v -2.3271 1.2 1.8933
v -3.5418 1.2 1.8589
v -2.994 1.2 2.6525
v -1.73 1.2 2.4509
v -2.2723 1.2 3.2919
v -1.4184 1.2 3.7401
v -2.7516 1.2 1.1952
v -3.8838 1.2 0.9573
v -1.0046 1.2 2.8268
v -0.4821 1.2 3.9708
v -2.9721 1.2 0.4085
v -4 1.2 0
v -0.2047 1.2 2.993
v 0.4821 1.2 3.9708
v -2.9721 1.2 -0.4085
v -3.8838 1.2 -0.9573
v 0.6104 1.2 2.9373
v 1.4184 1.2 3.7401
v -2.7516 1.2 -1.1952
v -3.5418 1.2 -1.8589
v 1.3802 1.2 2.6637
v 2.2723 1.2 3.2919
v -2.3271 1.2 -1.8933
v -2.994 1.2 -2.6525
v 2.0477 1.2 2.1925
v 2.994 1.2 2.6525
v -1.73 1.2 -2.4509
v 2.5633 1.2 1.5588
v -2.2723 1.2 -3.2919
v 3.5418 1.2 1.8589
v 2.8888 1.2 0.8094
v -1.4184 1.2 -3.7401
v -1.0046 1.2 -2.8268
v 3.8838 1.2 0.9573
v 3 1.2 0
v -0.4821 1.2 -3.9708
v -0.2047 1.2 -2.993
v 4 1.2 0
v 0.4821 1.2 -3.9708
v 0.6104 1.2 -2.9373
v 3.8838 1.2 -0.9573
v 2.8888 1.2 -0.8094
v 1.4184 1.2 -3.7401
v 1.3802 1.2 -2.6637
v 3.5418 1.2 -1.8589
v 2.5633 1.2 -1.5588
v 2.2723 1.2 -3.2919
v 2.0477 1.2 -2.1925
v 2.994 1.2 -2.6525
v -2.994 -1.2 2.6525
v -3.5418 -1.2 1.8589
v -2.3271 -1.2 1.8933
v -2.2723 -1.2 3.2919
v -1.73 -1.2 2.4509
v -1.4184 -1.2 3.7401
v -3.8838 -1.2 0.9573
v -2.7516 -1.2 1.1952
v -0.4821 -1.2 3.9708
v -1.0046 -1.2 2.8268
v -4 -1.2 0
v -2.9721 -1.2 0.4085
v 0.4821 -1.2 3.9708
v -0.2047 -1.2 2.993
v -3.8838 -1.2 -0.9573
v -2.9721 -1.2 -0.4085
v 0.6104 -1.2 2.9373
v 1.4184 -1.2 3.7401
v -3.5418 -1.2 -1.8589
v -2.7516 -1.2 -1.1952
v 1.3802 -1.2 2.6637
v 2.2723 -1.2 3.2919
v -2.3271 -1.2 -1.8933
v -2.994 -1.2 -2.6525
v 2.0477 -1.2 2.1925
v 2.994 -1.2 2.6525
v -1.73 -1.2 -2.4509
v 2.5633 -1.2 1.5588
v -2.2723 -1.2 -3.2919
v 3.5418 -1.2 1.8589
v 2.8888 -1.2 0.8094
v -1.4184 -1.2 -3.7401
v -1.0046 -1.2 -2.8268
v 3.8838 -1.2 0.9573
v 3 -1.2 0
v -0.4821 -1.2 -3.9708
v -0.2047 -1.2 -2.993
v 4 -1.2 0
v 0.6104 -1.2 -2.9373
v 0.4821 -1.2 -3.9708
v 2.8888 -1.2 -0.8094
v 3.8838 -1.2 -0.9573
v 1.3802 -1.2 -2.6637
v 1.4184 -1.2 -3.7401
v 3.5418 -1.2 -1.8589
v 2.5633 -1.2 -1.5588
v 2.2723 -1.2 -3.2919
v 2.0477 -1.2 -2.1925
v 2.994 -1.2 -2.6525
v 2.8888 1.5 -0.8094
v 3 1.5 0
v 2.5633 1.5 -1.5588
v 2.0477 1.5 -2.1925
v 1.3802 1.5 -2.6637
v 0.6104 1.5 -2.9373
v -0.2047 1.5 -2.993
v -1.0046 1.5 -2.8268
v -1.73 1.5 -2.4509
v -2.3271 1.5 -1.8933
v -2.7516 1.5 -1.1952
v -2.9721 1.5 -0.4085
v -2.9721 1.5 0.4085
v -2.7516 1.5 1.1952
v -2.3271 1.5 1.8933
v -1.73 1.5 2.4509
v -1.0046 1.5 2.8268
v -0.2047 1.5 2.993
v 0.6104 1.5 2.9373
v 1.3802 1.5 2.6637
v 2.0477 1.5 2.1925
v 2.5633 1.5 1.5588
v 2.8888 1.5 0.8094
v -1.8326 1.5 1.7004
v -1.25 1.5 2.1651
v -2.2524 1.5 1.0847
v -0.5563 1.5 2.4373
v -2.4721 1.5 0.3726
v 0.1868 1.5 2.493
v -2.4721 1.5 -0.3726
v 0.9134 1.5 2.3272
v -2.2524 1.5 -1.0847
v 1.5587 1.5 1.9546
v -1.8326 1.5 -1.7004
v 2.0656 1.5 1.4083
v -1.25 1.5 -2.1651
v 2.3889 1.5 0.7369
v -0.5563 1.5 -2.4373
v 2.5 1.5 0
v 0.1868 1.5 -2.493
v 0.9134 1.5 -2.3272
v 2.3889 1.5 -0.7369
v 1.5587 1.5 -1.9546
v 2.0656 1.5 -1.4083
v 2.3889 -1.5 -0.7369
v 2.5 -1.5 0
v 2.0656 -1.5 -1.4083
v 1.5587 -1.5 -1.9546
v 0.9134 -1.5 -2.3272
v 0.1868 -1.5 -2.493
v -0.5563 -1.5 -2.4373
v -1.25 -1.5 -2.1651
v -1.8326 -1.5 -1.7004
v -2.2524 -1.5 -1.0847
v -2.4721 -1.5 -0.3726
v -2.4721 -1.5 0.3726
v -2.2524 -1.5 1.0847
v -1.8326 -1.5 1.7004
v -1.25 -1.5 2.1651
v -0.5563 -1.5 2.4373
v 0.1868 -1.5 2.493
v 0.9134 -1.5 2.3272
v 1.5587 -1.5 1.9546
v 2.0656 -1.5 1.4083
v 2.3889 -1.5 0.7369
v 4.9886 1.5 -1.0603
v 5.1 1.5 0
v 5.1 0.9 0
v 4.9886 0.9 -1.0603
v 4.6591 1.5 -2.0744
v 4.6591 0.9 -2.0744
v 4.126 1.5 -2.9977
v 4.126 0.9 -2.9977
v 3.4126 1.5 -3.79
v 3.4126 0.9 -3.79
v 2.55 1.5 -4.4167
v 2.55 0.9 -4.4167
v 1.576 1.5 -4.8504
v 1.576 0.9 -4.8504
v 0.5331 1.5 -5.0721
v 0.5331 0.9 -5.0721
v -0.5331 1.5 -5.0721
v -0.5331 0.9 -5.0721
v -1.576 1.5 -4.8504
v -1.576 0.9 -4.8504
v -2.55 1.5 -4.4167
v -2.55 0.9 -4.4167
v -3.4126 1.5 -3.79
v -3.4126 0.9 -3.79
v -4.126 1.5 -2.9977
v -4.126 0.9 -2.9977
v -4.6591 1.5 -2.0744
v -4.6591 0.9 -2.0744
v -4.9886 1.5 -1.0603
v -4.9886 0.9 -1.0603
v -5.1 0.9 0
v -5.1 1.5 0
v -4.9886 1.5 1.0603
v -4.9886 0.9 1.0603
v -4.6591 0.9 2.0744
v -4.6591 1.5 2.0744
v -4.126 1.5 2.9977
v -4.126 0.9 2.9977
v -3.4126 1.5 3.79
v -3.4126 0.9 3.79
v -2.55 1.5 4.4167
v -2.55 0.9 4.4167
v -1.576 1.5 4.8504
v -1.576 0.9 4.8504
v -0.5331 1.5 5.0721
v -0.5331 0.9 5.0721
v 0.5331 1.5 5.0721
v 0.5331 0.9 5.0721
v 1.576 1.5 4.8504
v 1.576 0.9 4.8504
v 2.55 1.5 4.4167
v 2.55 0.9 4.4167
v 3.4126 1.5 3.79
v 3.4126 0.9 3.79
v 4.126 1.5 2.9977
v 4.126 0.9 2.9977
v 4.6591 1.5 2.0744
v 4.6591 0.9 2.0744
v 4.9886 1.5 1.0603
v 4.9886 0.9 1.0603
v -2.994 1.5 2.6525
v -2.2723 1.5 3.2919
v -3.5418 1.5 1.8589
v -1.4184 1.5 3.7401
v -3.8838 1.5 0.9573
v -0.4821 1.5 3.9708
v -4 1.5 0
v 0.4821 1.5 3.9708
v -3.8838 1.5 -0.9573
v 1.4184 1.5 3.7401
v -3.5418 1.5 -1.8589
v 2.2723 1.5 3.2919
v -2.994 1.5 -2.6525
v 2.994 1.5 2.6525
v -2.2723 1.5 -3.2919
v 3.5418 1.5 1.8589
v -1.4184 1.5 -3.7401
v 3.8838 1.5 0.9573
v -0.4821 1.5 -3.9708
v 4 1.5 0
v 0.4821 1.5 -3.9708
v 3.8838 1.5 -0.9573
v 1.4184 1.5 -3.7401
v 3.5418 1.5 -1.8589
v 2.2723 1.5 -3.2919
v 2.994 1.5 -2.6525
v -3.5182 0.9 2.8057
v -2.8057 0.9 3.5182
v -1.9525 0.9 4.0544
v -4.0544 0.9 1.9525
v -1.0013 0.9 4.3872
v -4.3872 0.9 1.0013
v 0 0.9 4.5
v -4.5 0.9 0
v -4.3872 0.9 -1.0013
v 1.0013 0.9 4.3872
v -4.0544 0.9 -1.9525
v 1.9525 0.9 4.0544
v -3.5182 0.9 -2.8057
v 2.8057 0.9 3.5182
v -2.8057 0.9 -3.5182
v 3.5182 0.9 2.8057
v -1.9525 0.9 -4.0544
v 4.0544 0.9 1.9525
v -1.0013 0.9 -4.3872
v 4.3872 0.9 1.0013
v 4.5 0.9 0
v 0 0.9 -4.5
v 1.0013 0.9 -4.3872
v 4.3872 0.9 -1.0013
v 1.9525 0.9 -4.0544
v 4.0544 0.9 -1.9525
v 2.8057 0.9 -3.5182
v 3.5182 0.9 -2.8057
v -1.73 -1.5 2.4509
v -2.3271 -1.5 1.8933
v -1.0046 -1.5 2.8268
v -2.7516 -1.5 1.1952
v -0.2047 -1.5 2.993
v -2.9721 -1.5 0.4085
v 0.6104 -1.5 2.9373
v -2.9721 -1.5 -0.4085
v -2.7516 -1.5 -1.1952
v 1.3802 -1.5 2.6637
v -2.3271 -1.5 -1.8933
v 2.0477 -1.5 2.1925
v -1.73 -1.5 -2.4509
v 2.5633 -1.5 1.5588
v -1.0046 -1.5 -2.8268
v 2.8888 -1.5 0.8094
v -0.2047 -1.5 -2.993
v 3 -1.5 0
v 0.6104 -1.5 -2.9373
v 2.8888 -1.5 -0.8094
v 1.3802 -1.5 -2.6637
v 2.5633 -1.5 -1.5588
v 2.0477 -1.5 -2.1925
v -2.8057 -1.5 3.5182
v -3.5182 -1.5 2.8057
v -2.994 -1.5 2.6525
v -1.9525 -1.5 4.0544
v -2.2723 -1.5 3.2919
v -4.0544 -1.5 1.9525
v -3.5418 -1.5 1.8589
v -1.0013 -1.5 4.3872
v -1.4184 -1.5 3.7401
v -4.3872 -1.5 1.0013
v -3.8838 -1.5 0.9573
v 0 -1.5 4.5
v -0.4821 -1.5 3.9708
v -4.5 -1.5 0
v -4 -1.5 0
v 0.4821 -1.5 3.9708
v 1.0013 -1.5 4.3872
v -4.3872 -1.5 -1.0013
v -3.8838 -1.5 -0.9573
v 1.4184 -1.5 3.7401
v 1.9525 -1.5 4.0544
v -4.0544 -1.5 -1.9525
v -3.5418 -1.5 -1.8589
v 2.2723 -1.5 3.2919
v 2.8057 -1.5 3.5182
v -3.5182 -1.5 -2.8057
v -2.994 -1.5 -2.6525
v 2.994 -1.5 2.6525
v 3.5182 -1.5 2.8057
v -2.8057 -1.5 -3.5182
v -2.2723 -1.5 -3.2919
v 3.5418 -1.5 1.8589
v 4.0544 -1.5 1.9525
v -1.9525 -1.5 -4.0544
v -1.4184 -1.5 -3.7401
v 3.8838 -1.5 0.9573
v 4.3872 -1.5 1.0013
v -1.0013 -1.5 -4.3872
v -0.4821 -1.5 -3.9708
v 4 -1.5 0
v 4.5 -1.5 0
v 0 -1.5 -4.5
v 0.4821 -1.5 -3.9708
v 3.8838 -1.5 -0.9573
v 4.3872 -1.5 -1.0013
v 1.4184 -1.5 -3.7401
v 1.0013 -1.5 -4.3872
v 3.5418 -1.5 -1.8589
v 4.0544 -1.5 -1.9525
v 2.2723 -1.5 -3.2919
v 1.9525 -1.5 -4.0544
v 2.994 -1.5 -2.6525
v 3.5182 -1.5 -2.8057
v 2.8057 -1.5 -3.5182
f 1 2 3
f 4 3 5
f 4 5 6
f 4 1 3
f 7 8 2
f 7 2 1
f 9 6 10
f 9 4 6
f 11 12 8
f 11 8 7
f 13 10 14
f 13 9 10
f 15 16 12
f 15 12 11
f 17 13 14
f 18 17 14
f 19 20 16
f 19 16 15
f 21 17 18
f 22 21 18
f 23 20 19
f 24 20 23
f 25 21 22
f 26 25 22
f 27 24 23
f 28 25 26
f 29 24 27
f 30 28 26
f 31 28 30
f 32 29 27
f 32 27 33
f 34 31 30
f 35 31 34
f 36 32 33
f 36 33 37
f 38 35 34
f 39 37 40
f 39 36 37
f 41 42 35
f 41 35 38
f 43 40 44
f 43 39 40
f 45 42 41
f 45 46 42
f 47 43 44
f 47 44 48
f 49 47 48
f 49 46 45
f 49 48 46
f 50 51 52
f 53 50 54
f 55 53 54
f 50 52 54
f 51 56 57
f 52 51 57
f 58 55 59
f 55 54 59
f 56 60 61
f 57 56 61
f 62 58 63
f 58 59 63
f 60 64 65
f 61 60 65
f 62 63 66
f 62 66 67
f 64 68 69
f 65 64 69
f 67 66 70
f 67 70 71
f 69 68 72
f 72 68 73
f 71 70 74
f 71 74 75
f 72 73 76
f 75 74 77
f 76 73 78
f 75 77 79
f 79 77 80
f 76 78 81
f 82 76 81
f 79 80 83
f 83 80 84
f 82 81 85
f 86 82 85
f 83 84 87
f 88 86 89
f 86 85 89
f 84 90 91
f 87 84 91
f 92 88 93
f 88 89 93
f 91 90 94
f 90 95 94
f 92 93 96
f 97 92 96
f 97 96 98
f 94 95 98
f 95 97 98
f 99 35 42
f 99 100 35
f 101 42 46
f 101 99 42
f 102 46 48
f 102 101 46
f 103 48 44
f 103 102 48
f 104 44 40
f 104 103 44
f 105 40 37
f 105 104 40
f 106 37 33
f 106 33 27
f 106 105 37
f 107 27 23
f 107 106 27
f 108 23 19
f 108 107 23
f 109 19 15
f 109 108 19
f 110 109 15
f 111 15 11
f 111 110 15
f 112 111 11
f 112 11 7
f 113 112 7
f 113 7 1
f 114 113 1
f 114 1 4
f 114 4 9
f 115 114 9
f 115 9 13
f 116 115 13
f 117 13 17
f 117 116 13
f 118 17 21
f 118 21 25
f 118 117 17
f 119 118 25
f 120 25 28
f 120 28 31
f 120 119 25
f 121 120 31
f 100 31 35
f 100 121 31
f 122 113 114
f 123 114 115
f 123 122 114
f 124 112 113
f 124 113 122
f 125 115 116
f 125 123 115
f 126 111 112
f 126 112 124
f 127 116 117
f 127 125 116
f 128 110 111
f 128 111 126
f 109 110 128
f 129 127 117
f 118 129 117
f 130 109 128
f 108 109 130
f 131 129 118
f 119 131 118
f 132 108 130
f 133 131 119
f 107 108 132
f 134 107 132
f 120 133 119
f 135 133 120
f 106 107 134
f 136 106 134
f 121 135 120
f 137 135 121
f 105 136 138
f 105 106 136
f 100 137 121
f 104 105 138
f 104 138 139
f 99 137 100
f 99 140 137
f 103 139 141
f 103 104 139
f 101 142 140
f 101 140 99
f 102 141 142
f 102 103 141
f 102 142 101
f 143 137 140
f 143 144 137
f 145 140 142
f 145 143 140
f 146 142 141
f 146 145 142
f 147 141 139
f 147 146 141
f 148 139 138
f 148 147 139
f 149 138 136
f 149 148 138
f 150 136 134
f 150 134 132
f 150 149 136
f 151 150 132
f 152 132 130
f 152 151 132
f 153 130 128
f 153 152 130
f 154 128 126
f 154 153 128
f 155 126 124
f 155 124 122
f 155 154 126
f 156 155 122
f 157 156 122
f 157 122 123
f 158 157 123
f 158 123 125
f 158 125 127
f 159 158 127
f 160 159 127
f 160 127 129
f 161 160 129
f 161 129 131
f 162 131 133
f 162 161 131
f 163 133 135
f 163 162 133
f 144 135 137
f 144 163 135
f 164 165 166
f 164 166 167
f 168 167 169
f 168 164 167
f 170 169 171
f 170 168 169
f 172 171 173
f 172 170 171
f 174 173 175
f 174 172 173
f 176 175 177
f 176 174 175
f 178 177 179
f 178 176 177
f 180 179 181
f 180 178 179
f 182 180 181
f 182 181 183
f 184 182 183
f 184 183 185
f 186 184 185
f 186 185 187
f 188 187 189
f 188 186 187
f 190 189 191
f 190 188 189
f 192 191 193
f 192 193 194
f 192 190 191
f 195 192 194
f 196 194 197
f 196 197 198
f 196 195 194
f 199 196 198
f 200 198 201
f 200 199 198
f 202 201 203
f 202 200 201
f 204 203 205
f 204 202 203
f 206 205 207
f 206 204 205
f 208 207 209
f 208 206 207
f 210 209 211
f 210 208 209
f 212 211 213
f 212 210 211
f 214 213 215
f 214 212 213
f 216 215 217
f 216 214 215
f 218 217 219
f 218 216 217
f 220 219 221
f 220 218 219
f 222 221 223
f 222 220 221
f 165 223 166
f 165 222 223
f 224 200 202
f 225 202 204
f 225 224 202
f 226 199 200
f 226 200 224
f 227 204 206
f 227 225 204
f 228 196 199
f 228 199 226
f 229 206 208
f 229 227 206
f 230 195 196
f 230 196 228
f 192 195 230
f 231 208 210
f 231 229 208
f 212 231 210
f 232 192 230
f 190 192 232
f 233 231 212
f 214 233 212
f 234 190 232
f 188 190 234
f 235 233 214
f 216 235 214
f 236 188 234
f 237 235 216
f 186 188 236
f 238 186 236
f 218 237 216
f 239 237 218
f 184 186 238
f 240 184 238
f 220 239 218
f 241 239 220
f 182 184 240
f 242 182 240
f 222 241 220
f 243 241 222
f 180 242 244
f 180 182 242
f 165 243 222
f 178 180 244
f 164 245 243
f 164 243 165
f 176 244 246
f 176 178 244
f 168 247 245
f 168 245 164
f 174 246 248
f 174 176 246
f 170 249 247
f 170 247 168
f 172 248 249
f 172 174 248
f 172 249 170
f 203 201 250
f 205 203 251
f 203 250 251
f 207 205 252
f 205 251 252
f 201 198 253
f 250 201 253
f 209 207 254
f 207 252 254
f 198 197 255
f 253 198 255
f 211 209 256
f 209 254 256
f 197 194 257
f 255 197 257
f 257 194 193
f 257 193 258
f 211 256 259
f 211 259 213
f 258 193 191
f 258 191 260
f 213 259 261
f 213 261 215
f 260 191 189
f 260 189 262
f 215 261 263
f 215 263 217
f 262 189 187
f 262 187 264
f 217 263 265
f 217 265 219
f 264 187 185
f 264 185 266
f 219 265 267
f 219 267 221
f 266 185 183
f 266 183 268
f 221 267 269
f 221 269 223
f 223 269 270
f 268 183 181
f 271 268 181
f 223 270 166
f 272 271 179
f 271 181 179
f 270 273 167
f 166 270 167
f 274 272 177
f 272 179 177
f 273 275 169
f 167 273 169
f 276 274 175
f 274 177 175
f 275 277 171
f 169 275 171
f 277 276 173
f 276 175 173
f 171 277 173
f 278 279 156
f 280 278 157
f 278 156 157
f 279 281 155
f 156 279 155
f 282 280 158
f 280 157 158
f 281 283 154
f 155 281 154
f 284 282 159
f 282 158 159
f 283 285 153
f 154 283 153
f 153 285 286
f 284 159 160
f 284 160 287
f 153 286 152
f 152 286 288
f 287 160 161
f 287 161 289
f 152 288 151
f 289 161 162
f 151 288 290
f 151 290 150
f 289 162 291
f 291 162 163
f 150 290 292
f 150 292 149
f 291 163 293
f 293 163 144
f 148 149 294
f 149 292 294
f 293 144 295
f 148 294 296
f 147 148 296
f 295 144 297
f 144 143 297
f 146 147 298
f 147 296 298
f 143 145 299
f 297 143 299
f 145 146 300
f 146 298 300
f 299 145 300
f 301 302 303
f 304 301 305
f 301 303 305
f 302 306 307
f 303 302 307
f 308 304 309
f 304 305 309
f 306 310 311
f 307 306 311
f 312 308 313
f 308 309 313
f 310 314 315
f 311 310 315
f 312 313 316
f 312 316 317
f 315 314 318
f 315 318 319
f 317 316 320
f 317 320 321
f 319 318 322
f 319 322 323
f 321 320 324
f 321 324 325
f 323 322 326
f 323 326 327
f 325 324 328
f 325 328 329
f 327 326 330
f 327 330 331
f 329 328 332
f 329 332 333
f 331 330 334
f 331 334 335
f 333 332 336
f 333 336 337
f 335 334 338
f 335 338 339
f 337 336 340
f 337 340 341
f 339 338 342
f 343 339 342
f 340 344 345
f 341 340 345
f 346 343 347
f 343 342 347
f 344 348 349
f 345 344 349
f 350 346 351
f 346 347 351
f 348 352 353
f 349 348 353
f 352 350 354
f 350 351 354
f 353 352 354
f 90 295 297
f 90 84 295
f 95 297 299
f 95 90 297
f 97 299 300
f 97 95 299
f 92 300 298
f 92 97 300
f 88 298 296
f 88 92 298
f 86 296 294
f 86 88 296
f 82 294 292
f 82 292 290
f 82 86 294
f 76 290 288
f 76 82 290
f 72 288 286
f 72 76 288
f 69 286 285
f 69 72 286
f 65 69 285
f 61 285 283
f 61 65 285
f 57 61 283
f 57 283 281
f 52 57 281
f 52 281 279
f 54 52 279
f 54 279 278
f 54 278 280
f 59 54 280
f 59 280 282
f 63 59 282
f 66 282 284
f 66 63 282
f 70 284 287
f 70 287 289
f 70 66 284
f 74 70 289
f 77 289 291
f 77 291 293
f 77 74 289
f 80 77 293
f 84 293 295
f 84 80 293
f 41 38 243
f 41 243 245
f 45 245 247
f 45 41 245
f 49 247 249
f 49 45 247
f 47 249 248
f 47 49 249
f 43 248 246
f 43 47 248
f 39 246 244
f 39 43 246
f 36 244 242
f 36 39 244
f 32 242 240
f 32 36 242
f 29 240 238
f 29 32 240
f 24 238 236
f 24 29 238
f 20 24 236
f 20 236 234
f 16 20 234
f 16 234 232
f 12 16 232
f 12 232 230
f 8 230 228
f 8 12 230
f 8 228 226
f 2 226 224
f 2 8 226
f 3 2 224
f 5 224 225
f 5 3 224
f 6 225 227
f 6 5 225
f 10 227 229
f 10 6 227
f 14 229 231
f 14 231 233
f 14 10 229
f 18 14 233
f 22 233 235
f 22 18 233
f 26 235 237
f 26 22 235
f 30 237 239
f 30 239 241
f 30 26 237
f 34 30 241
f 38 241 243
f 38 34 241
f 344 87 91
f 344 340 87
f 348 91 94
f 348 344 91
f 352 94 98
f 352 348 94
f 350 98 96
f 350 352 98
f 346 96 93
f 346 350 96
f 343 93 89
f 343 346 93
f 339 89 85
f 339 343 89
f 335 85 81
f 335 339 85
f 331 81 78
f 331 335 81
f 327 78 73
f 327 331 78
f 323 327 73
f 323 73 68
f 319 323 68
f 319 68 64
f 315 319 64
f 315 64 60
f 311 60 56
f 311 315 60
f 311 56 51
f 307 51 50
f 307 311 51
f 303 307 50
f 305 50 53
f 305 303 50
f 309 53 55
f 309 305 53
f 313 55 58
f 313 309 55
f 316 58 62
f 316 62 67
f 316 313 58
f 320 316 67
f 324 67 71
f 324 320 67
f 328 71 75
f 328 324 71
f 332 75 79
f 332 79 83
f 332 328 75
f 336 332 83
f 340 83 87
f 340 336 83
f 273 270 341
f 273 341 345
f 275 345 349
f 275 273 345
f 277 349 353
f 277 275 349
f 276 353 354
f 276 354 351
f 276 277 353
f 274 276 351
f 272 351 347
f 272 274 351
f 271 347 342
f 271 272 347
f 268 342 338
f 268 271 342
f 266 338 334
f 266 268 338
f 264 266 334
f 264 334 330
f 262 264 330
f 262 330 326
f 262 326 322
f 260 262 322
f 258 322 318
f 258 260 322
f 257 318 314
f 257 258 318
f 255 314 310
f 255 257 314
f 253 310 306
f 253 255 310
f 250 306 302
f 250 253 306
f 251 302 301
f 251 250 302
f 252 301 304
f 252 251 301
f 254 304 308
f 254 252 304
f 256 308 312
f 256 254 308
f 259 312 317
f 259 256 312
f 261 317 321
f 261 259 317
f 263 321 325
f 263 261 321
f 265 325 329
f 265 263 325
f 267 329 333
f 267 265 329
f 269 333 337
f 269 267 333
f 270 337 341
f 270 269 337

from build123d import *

# Parameters (mm, degrees)
EXTRUDE_1_DEPTH        = 1.5
EXTRUDE_1_DEPTH_BACK   = 1.5
SKETCH_1_R             = 3
SKETCH_1_R_2           = 2.5
EXTRUDE_1_2_DEPTH      = 1.5
EXTRUDE_1_2_DEPTH_BACK = 1.5
SKETCH_1_R_3           = 4.5
SKETCH_1_R_4           = 4
EXTRUDE_2_DEPTH        = 1.2
EXTRUDE_2_DEPTH_BACK   = 1.2
SKETCH_2_R             = 4
SKETCH_2_R_2           = 3
SKETCH_3_R             = 5.1
SKETCH_3_R_2           = 4.5
EXTRUDE_3_DEPTH        = 0.6


with BuildPart() as part:
    # 草图1 → 凸台-拉伸1 (new, two sides: drawn at the far end of the back side and taken through both)
    with BuildSketch(Plane(origin=(0, 0, 0), x_dir=(1, 0, 0), z_dir=(0, 1, 0)).offset(-EXTRUDE_1_DEPTH_BACK)):
        Circle(SKETCH_1_R)
        Circle(SKETCH_1_R_2, mode=Mode.SUBTRACT)
    extrude(amount=EXTRUDE_1_DEPTH + EXTRUDE_1_DEPTH_BACK)



with BuildPart() as body_2:
    # 草图1 → Extrude 1 2 (new, two sides: drawn at the far end of the back side and taken through both)
    with BuildSketch(Plane(origin=(0, 0, 0), x_dir=(1, 0, 0), z_dir=(0, 1, 0)).offset(-EXTRUDE_1_2_DEPTH_BACK)):
        Circle(SKETCH_1_R_3)
        Circle(SKETCH_1_R_4, mode=Mode.SUBTRACT)
    extrude(amount=EXTRUDE_1_2_DEPTH + EXTRUDE_1_2_DEPTH_BACK)


with BuildPart() as part_1:
    add(part.part)

    add(body_2.part)  # 凸台-拉伸2 merges body 2
    # 草图2 → 凸台-拉伸2 (add, two sides: drawn at the far end of the back side and taken through both)
    with BuildSketch(Plane(origin=(0, 0, 0), x_dir=(1, 0, 0), z_dir=(0, 1, 0)).offset(-EXTRUDE_2_DEPTH_BACK)):
        Circle(SKETCH_2_R)
        Circle(SKETCH_2_R_2, mode=Mode.SUBTRACT)
    extrude(amount=EXTRUDE_2_DEPTH + EXTRUDE_2_DEPTH_BACK)

    # 草图3 → 凸台-拉伸3 (add)
    with BuildSketch(Plane(origin=(0, 1.5, 0), x_dir=(1, 0, 0), z_dir=(0, 1, 0))):
        Circle(SKETCH_3_R)
        Circle(SKETCH_3_R_2, mode=Mode.SUBTRACT)
    extrude(amount=-EXTRUDE_3_DEPTH)


solid = part_1.part
